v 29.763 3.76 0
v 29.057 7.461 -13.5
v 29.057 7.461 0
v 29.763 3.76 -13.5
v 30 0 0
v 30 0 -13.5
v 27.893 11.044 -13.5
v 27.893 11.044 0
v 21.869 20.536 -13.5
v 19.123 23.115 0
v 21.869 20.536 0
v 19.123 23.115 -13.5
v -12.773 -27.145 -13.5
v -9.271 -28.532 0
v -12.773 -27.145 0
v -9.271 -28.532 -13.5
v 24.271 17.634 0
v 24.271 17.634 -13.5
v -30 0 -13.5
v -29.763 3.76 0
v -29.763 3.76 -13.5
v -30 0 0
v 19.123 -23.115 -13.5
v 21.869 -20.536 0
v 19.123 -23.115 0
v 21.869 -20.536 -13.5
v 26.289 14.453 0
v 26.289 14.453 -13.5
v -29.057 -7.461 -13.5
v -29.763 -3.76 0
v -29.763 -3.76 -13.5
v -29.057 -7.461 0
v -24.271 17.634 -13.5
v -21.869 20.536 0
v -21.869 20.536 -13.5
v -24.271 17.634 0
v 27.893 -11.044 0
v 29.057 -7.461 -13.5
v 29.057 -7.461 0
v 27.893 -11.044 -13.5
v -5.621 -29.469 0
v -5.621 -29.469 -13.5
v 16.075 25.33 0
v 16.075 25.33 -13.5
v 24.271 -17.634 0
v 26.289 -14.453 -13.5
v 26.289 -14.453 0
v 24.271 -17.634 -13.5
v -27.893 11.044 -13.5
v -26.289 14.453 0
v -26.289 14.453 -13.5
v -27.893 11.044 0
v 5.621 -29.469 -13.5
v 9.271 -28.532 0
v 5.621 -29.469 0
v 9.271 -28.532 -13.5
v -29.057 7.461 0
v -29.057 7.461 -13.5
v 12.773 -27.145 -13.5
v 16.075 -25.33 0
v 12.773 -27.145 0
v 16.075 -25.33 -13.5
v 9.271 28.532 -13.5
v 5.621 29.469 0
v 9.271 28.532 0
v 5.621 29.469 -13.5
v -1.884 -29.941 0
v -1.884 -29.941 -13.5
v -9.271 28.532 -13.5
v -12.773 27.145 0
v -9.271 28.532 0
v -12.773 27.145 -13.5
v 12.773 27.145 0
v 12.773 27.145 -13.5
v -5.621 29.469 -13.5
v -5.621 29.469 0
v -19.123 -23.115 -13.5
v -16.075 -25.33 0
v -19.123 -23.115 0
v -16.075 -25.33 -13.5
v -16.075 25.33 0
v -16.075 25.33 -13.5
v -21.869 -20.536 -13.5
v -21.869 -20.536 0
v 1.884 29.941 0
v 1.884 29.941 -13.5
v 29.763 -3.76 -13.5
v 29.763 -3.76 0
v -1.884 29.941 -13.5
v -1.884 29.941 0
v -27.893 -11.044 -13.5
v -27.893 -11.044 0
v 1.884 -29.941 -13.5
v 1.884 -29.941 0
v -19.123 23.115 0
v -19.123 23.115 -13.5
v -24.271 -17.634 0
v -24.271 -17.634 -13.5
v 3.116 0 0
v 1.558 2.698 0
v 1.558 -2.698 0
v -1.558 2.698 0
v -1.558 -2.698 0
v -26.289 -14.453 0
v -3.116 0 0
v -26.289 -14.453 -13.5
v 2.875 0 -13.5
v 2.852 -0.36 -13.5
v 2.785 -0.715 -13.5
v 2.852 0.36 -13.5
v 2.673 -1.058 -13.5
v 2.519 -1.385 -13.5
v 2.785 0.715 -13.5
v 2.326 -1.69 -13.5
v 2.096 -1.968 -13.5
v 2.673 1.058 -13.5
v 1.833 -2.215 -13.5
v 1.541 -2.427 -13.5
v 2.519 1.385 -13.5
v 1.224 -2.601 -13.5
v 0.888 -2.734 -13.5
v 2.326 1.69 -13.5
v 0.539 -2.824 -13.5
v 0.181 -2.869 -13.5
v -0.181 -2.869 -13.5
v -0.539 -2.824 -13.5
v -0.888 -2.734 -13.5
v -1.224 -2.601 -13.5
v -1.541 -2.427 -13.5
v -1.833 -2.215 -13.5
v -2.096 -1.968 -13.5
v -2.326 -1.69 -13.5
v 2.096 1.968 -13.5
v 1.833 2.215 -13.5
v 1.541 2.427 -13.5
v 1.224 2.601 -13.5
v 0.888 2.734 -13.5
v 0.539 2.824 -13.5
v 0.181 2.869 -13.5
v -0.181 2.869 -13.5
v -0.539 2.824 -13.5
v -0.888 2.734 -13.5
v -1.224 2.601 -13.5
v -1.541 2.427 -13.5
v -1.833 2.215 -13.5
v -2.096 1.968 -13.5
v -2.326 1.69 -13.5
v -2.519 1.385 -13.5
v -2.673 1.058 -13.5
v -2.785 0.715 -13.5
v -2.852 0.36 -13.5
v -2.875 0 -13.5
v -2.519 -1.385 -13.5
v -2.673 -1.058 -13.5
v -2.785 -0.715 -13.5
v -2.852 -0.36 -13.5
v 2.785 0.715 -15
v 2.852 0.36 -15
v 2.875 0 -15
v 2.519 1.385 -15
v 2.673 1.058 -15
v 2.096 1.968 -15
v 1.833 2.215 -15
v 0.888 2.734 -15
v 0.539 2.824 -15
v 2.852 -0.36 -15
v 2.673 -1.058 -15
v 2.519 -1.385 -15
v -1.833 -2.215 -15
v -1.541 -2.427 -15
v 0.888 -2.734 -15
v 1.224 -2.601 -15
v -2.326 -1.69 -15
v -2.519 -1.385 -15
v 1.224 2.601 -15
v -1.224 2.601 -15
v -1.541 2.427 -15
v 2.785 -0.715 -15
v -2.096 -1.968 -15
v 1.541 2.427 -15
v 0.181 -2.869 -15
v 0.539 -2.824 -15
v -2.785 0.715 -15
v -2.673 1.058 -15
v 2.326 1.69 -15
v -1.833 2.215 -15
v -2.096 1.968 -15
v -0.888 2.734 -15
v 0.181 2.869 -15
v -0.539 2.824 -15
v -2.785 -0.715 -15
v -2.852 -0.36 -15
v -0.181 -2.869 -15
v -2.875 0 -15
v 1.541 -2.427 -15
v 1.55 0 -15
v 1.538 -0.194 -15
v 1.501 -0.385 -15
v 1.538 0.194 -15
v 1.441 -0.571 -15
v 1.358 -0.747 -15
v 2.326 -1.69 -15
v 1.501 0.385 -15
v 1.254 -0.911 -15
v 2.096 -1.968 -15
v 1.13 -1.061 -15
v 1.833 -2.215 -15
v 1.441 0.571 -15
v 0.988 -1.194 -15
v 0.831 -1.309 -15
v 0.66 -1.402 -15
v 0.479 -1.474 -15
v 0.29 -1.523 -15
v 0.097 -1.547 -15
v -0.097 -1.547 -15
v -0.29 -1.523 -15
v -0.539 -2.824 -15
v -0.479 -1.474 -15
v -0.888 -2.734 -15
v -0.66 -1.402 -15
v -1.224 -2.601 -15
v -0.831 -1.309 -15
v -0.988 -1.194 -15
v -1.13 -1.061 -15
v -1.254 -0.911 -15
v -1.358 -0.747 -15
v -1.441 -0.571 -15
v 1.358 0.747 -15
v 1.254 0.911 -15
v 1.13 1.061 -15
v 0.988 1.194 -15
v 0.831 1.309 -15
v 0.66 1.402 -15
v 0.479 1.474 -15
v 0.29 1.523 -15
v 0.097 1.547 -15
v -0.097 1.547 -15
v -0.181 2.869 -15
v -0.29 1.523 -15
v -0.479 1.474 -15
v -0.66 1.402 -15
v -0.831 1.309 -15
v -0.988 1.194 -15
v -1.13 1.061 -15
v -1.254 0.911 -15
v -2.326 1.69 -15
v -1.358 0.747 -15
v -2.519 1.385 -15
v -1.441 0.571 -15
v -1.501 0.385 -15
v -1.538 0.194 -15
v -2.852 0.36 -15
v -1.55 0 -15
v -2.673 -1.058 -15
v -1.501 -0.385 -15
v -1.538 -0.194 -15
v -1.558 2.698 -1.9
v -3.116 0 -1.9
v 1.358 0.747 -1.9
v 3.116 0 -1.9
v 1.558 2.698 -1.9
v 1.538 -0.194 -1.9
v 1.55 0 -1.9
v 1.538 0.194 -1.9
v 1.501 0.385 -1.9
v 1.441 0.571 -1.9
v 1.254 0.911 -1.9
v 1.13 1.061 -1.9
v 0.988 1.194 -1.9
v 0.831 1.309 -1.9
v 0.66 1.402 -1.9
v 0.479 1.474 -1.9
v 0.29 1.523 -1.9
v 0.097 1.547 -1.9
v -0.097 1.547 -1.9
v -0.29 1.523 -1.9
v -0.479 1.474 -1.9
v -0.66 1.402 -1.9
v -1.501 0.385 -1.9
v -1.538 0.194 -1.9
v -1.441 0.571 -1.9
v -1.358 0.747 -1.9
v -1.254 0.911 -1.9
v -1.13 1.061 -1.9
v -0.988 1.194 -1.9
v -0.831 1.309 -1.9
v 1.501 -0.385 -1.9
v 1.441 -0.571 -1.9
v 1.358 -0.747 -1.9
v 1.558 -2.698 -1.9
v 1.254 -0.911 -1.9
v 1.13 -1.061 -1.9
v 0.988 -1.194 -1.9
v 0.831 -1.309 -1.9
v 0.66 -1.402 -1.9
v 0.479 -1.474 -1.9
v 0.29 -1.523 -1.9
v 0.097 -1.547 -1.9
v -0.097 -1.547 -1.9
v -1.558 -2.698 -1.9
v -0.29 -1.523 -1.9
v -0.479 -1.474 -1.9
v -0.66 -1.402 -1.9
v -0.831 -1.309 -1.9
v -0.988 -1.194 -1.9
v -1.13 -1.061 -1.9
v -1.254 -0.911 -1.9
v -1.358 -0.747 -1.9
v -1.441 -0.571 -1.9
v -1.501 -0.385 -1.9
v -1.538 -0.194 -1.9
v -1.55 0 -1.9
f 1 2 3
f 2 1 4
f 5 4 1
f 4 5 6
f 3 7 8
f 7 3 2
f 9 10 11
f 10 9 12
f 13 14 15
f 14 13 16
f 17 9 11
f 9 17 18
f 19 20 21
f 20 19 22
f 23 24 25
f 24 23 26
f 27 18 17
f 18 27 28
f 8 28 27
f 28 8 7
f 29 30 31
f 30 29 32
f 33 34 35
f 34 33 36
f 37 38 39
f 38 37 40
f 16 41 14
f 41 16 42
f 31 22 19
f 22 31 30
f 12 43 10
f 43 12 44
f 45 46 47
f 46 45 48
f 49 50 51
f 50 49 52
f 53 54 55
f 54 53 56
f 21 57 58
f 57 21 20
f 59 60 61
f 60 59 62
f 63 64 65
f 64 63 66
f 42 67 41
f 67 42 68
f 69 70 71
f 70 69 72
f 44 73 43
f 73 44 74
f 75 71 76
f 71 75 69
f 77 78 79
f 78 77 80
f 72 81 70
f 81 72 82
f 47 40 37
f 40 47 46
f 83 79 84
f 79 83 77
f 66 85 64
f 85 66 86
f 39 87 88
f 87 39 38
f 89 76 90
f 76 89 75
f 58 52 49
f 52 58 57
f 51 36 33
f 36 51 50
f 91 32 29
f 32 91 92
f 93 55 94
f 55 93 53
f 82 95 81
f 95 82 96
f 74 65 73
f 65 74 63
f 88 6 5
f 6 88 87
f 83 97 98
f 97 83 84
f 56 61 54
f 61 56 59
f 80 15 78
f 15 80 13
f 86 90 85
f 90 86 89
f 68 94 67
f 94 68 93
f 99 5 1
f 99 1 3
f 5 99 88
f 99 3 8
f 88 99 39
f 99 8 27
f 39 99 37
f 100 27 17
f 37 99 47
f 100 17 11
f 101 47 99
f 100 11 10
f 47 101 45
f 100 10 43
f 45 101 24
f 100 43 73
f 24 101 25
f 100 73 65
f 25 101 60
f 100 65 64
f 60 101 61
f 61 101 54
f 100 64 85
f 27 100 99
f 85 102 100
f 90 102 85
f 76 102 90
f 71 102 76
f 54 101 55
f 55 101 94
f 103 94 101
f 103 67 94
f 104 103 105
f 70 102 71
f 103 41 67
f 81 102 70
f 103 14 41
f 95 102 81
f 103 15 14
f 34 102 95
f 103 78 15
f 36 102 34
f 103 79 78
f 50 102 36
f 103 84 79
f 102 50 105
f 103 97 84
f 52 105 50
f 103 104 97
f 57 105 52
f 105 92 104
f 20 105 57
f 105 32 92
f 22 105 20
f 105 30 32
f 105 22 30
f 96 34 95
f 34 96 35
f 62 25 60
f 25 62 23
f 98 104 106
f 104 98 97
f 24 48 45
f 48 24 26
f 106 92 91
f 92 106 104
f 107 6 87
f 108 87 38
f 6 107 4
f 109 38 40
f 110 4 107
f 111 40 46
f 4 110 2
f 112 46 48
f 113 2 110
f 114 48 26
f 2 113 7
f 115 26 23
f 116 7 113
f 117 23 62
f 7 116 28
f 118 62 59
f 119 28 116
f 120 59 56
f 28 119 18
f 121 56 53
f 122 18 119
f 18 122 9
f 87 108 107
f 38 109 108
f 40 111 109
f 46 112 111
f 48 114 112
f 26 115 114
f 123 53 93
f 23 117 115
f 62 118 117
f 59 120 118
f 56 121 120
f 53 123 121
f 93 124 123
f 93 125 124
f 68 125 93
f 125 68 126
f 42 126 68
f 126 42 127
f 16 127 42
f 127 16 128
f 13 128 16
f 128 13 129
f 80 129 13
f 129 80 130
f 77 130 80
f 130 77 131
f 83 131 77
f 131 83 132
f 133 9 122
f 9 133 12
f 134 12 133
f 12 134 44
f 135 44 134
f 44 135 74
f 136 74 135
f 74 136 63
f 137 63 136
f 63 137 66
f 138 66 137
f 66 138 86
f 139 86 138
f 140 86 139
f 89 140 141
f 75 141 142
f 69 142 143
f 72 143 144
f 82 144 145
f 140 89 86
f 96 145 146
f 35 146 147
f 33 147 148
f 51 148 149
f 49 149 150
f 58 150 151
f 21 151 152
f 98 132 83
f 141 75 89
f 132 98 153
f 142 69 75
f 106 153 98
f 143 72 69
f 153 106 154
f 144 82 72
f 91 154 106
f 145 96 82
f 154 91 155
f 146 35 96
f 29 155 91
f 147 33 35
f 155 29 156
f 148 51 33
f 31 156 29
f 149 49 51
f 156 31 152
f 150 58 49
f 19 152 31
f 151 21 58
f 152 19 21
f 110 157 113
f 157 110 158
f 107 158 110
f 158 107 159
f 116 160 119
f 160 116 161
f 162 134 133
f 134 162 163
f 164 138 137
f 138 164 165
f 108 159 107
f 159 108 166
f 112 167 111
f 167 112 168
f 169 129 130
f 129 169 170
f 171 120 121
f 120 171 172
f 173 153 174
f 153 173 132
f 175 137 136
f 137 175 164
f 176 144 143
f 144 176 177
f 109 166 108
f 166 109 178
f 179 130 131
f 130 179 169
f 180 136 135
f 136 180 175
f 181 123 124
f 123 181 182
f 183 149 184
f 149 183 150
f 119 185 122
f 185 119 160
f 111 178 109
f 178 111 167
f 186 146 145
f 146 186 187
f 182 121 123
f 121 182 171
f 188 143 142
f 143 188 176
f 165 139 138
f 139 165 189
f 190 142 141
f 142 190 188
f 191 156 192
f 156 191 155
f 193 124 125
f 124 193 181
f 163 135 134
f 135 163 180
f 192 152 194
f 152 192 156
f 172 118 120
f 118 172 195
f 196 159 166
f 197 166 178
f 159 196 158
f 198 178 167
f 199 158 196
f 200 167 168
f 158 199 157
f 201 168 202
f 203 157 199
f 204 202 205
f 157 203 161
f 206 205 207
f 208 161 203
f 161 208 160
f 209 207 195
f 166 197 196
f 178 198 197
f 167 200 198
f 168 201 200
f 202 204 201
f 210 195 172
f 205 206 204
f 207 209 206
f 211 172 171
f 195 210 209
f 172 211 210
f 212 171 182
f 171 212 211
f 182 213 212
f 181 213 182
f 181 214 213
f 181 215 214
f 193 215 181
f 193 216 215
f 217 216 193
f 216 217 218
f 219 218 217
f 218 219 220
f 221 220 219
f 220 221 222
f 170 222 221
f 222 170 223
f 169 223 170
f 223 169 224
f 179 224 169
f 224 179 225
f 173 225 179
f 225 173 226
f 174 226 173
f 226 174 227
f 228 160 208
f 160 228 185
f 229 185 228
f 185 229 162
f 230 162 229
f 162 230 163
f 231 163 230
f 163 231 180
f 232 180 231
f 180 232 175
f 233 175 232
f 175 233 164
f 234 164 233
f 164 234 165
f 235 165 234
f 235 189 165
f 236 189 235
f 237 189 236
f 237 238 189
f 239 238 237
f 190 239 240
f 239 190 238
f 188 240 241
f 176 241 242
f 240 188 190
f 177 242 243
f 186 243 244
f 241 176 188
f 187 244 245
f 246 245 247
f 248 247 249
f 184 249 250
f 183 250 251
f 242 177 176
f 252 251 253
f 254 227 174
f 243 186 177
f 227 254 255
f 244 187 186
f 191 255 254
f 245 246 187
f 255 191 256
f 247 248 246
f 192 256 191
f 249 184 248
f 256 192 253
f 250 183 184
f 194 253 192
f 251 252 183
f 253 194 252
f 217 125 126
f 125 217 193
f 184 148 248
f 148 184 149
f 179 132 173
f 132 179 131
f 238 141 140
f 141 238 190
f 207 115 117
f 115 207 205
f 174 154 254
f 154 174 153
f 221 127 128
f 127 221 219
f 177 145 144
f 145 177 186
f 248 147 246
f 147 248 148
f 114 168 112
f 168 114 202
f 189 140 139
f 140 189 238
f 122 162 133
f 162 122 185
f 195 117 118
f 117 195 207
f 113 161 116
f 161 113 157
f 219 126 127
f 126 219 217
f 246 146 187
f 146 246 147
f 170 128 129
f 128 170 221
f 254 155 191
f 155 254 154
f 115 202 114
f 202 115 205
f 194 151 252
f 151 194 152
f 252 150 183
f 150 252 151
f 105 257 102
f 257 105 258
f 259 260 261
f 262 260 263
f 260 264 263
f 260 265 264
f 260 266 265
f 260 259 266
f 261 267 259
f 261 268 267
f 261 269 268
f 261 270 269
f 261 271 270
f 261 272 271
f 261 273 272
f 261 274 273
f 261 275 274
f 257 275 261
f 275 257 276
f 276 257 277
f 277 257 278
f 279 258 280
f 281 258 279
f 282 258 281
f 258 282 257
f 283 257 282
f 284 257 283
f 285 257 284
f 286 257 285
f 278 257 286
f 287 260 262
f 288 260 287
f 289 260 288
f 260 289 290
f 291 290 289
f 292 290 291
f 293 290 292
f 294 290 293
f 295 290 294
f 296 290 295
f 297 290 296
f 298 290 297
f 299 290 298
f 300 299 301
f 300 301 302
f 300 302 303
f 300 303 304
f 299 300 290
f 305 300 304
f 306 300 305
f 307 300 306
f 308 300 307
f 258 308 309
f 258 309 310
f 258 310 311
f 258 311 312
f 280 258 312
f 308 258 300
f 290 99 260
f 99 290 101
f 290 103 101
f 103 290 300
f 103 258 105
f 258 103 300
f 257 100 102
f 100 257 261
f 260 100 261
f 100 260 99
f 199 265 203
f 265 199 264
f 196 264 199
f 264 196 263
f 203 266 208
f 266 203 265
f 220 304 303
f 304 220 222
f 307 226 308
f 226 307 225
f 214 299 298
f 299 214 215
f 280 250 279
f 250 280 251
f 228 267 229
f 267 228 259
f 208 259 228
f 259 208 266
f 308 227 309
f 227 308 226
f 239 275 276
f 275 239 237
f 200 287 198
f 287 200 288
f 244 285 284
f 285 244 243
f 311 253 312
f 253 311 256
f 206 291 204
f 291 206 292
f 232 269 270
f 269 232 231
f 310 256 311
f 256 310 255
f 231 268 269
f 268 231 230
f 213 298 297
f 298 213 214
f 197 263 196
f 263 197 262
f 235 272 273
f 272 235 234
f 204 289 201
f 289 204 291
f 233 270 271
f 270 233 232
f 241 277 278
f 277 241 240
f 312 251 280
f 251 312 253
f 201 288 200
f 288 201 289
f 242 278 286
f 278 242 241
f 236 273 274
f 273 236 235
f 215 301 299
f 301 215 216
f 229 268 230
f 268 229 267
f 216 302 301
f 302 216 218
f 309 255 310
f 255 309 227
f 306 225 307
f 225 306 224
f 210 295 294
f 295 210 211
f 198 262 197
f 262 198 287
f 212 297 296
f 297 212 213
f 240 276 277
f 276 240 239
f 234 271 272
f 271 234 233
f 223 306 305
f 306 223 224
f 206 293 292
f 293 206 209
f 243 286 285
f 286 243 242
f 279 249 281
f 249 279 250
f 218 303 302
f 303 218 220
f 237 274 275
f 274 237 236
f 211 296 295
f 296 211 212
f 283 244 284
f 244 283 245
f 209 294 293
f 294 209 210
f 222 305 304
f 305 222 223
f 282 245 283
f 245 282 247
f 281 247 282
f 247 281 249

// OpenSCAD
$fn = 50;

difference() {
	union() {
		translate(v = [0, 0, -13.5]) {
			cylinder(h = 13.5, r = 30.0);
		}
		#translate(v = [0, 0, -15.0]) {
			cylinder(h = 15, r = 2.875);
		}
	}
	union() {
		translate(v = [0, 0, 0]) {
			rotate(a = [0, 0, 0]) {
				difference() {
					union() {
						translate(v = [0, 0, -1.9]) {
							linear_extrude(height = 1.9) {
								polygon(points = [[3.1158, 0.0], [1.5579000000000005, 2.698361953111554], [-1.5578999999999994, 2.6983619531115544], [-3.1158, 3.815754496783323e-16], [-1.5579000000000014, -2.6983619531115535], [1.557899999999998, -2.6983619531115552]]);
							}
						}
					}
					union();
				}
			}
		}
		#translate(v = [0, 0, -100.0]) {
			cylinder(h = 200, r = 1.55);
		}
	}
}
